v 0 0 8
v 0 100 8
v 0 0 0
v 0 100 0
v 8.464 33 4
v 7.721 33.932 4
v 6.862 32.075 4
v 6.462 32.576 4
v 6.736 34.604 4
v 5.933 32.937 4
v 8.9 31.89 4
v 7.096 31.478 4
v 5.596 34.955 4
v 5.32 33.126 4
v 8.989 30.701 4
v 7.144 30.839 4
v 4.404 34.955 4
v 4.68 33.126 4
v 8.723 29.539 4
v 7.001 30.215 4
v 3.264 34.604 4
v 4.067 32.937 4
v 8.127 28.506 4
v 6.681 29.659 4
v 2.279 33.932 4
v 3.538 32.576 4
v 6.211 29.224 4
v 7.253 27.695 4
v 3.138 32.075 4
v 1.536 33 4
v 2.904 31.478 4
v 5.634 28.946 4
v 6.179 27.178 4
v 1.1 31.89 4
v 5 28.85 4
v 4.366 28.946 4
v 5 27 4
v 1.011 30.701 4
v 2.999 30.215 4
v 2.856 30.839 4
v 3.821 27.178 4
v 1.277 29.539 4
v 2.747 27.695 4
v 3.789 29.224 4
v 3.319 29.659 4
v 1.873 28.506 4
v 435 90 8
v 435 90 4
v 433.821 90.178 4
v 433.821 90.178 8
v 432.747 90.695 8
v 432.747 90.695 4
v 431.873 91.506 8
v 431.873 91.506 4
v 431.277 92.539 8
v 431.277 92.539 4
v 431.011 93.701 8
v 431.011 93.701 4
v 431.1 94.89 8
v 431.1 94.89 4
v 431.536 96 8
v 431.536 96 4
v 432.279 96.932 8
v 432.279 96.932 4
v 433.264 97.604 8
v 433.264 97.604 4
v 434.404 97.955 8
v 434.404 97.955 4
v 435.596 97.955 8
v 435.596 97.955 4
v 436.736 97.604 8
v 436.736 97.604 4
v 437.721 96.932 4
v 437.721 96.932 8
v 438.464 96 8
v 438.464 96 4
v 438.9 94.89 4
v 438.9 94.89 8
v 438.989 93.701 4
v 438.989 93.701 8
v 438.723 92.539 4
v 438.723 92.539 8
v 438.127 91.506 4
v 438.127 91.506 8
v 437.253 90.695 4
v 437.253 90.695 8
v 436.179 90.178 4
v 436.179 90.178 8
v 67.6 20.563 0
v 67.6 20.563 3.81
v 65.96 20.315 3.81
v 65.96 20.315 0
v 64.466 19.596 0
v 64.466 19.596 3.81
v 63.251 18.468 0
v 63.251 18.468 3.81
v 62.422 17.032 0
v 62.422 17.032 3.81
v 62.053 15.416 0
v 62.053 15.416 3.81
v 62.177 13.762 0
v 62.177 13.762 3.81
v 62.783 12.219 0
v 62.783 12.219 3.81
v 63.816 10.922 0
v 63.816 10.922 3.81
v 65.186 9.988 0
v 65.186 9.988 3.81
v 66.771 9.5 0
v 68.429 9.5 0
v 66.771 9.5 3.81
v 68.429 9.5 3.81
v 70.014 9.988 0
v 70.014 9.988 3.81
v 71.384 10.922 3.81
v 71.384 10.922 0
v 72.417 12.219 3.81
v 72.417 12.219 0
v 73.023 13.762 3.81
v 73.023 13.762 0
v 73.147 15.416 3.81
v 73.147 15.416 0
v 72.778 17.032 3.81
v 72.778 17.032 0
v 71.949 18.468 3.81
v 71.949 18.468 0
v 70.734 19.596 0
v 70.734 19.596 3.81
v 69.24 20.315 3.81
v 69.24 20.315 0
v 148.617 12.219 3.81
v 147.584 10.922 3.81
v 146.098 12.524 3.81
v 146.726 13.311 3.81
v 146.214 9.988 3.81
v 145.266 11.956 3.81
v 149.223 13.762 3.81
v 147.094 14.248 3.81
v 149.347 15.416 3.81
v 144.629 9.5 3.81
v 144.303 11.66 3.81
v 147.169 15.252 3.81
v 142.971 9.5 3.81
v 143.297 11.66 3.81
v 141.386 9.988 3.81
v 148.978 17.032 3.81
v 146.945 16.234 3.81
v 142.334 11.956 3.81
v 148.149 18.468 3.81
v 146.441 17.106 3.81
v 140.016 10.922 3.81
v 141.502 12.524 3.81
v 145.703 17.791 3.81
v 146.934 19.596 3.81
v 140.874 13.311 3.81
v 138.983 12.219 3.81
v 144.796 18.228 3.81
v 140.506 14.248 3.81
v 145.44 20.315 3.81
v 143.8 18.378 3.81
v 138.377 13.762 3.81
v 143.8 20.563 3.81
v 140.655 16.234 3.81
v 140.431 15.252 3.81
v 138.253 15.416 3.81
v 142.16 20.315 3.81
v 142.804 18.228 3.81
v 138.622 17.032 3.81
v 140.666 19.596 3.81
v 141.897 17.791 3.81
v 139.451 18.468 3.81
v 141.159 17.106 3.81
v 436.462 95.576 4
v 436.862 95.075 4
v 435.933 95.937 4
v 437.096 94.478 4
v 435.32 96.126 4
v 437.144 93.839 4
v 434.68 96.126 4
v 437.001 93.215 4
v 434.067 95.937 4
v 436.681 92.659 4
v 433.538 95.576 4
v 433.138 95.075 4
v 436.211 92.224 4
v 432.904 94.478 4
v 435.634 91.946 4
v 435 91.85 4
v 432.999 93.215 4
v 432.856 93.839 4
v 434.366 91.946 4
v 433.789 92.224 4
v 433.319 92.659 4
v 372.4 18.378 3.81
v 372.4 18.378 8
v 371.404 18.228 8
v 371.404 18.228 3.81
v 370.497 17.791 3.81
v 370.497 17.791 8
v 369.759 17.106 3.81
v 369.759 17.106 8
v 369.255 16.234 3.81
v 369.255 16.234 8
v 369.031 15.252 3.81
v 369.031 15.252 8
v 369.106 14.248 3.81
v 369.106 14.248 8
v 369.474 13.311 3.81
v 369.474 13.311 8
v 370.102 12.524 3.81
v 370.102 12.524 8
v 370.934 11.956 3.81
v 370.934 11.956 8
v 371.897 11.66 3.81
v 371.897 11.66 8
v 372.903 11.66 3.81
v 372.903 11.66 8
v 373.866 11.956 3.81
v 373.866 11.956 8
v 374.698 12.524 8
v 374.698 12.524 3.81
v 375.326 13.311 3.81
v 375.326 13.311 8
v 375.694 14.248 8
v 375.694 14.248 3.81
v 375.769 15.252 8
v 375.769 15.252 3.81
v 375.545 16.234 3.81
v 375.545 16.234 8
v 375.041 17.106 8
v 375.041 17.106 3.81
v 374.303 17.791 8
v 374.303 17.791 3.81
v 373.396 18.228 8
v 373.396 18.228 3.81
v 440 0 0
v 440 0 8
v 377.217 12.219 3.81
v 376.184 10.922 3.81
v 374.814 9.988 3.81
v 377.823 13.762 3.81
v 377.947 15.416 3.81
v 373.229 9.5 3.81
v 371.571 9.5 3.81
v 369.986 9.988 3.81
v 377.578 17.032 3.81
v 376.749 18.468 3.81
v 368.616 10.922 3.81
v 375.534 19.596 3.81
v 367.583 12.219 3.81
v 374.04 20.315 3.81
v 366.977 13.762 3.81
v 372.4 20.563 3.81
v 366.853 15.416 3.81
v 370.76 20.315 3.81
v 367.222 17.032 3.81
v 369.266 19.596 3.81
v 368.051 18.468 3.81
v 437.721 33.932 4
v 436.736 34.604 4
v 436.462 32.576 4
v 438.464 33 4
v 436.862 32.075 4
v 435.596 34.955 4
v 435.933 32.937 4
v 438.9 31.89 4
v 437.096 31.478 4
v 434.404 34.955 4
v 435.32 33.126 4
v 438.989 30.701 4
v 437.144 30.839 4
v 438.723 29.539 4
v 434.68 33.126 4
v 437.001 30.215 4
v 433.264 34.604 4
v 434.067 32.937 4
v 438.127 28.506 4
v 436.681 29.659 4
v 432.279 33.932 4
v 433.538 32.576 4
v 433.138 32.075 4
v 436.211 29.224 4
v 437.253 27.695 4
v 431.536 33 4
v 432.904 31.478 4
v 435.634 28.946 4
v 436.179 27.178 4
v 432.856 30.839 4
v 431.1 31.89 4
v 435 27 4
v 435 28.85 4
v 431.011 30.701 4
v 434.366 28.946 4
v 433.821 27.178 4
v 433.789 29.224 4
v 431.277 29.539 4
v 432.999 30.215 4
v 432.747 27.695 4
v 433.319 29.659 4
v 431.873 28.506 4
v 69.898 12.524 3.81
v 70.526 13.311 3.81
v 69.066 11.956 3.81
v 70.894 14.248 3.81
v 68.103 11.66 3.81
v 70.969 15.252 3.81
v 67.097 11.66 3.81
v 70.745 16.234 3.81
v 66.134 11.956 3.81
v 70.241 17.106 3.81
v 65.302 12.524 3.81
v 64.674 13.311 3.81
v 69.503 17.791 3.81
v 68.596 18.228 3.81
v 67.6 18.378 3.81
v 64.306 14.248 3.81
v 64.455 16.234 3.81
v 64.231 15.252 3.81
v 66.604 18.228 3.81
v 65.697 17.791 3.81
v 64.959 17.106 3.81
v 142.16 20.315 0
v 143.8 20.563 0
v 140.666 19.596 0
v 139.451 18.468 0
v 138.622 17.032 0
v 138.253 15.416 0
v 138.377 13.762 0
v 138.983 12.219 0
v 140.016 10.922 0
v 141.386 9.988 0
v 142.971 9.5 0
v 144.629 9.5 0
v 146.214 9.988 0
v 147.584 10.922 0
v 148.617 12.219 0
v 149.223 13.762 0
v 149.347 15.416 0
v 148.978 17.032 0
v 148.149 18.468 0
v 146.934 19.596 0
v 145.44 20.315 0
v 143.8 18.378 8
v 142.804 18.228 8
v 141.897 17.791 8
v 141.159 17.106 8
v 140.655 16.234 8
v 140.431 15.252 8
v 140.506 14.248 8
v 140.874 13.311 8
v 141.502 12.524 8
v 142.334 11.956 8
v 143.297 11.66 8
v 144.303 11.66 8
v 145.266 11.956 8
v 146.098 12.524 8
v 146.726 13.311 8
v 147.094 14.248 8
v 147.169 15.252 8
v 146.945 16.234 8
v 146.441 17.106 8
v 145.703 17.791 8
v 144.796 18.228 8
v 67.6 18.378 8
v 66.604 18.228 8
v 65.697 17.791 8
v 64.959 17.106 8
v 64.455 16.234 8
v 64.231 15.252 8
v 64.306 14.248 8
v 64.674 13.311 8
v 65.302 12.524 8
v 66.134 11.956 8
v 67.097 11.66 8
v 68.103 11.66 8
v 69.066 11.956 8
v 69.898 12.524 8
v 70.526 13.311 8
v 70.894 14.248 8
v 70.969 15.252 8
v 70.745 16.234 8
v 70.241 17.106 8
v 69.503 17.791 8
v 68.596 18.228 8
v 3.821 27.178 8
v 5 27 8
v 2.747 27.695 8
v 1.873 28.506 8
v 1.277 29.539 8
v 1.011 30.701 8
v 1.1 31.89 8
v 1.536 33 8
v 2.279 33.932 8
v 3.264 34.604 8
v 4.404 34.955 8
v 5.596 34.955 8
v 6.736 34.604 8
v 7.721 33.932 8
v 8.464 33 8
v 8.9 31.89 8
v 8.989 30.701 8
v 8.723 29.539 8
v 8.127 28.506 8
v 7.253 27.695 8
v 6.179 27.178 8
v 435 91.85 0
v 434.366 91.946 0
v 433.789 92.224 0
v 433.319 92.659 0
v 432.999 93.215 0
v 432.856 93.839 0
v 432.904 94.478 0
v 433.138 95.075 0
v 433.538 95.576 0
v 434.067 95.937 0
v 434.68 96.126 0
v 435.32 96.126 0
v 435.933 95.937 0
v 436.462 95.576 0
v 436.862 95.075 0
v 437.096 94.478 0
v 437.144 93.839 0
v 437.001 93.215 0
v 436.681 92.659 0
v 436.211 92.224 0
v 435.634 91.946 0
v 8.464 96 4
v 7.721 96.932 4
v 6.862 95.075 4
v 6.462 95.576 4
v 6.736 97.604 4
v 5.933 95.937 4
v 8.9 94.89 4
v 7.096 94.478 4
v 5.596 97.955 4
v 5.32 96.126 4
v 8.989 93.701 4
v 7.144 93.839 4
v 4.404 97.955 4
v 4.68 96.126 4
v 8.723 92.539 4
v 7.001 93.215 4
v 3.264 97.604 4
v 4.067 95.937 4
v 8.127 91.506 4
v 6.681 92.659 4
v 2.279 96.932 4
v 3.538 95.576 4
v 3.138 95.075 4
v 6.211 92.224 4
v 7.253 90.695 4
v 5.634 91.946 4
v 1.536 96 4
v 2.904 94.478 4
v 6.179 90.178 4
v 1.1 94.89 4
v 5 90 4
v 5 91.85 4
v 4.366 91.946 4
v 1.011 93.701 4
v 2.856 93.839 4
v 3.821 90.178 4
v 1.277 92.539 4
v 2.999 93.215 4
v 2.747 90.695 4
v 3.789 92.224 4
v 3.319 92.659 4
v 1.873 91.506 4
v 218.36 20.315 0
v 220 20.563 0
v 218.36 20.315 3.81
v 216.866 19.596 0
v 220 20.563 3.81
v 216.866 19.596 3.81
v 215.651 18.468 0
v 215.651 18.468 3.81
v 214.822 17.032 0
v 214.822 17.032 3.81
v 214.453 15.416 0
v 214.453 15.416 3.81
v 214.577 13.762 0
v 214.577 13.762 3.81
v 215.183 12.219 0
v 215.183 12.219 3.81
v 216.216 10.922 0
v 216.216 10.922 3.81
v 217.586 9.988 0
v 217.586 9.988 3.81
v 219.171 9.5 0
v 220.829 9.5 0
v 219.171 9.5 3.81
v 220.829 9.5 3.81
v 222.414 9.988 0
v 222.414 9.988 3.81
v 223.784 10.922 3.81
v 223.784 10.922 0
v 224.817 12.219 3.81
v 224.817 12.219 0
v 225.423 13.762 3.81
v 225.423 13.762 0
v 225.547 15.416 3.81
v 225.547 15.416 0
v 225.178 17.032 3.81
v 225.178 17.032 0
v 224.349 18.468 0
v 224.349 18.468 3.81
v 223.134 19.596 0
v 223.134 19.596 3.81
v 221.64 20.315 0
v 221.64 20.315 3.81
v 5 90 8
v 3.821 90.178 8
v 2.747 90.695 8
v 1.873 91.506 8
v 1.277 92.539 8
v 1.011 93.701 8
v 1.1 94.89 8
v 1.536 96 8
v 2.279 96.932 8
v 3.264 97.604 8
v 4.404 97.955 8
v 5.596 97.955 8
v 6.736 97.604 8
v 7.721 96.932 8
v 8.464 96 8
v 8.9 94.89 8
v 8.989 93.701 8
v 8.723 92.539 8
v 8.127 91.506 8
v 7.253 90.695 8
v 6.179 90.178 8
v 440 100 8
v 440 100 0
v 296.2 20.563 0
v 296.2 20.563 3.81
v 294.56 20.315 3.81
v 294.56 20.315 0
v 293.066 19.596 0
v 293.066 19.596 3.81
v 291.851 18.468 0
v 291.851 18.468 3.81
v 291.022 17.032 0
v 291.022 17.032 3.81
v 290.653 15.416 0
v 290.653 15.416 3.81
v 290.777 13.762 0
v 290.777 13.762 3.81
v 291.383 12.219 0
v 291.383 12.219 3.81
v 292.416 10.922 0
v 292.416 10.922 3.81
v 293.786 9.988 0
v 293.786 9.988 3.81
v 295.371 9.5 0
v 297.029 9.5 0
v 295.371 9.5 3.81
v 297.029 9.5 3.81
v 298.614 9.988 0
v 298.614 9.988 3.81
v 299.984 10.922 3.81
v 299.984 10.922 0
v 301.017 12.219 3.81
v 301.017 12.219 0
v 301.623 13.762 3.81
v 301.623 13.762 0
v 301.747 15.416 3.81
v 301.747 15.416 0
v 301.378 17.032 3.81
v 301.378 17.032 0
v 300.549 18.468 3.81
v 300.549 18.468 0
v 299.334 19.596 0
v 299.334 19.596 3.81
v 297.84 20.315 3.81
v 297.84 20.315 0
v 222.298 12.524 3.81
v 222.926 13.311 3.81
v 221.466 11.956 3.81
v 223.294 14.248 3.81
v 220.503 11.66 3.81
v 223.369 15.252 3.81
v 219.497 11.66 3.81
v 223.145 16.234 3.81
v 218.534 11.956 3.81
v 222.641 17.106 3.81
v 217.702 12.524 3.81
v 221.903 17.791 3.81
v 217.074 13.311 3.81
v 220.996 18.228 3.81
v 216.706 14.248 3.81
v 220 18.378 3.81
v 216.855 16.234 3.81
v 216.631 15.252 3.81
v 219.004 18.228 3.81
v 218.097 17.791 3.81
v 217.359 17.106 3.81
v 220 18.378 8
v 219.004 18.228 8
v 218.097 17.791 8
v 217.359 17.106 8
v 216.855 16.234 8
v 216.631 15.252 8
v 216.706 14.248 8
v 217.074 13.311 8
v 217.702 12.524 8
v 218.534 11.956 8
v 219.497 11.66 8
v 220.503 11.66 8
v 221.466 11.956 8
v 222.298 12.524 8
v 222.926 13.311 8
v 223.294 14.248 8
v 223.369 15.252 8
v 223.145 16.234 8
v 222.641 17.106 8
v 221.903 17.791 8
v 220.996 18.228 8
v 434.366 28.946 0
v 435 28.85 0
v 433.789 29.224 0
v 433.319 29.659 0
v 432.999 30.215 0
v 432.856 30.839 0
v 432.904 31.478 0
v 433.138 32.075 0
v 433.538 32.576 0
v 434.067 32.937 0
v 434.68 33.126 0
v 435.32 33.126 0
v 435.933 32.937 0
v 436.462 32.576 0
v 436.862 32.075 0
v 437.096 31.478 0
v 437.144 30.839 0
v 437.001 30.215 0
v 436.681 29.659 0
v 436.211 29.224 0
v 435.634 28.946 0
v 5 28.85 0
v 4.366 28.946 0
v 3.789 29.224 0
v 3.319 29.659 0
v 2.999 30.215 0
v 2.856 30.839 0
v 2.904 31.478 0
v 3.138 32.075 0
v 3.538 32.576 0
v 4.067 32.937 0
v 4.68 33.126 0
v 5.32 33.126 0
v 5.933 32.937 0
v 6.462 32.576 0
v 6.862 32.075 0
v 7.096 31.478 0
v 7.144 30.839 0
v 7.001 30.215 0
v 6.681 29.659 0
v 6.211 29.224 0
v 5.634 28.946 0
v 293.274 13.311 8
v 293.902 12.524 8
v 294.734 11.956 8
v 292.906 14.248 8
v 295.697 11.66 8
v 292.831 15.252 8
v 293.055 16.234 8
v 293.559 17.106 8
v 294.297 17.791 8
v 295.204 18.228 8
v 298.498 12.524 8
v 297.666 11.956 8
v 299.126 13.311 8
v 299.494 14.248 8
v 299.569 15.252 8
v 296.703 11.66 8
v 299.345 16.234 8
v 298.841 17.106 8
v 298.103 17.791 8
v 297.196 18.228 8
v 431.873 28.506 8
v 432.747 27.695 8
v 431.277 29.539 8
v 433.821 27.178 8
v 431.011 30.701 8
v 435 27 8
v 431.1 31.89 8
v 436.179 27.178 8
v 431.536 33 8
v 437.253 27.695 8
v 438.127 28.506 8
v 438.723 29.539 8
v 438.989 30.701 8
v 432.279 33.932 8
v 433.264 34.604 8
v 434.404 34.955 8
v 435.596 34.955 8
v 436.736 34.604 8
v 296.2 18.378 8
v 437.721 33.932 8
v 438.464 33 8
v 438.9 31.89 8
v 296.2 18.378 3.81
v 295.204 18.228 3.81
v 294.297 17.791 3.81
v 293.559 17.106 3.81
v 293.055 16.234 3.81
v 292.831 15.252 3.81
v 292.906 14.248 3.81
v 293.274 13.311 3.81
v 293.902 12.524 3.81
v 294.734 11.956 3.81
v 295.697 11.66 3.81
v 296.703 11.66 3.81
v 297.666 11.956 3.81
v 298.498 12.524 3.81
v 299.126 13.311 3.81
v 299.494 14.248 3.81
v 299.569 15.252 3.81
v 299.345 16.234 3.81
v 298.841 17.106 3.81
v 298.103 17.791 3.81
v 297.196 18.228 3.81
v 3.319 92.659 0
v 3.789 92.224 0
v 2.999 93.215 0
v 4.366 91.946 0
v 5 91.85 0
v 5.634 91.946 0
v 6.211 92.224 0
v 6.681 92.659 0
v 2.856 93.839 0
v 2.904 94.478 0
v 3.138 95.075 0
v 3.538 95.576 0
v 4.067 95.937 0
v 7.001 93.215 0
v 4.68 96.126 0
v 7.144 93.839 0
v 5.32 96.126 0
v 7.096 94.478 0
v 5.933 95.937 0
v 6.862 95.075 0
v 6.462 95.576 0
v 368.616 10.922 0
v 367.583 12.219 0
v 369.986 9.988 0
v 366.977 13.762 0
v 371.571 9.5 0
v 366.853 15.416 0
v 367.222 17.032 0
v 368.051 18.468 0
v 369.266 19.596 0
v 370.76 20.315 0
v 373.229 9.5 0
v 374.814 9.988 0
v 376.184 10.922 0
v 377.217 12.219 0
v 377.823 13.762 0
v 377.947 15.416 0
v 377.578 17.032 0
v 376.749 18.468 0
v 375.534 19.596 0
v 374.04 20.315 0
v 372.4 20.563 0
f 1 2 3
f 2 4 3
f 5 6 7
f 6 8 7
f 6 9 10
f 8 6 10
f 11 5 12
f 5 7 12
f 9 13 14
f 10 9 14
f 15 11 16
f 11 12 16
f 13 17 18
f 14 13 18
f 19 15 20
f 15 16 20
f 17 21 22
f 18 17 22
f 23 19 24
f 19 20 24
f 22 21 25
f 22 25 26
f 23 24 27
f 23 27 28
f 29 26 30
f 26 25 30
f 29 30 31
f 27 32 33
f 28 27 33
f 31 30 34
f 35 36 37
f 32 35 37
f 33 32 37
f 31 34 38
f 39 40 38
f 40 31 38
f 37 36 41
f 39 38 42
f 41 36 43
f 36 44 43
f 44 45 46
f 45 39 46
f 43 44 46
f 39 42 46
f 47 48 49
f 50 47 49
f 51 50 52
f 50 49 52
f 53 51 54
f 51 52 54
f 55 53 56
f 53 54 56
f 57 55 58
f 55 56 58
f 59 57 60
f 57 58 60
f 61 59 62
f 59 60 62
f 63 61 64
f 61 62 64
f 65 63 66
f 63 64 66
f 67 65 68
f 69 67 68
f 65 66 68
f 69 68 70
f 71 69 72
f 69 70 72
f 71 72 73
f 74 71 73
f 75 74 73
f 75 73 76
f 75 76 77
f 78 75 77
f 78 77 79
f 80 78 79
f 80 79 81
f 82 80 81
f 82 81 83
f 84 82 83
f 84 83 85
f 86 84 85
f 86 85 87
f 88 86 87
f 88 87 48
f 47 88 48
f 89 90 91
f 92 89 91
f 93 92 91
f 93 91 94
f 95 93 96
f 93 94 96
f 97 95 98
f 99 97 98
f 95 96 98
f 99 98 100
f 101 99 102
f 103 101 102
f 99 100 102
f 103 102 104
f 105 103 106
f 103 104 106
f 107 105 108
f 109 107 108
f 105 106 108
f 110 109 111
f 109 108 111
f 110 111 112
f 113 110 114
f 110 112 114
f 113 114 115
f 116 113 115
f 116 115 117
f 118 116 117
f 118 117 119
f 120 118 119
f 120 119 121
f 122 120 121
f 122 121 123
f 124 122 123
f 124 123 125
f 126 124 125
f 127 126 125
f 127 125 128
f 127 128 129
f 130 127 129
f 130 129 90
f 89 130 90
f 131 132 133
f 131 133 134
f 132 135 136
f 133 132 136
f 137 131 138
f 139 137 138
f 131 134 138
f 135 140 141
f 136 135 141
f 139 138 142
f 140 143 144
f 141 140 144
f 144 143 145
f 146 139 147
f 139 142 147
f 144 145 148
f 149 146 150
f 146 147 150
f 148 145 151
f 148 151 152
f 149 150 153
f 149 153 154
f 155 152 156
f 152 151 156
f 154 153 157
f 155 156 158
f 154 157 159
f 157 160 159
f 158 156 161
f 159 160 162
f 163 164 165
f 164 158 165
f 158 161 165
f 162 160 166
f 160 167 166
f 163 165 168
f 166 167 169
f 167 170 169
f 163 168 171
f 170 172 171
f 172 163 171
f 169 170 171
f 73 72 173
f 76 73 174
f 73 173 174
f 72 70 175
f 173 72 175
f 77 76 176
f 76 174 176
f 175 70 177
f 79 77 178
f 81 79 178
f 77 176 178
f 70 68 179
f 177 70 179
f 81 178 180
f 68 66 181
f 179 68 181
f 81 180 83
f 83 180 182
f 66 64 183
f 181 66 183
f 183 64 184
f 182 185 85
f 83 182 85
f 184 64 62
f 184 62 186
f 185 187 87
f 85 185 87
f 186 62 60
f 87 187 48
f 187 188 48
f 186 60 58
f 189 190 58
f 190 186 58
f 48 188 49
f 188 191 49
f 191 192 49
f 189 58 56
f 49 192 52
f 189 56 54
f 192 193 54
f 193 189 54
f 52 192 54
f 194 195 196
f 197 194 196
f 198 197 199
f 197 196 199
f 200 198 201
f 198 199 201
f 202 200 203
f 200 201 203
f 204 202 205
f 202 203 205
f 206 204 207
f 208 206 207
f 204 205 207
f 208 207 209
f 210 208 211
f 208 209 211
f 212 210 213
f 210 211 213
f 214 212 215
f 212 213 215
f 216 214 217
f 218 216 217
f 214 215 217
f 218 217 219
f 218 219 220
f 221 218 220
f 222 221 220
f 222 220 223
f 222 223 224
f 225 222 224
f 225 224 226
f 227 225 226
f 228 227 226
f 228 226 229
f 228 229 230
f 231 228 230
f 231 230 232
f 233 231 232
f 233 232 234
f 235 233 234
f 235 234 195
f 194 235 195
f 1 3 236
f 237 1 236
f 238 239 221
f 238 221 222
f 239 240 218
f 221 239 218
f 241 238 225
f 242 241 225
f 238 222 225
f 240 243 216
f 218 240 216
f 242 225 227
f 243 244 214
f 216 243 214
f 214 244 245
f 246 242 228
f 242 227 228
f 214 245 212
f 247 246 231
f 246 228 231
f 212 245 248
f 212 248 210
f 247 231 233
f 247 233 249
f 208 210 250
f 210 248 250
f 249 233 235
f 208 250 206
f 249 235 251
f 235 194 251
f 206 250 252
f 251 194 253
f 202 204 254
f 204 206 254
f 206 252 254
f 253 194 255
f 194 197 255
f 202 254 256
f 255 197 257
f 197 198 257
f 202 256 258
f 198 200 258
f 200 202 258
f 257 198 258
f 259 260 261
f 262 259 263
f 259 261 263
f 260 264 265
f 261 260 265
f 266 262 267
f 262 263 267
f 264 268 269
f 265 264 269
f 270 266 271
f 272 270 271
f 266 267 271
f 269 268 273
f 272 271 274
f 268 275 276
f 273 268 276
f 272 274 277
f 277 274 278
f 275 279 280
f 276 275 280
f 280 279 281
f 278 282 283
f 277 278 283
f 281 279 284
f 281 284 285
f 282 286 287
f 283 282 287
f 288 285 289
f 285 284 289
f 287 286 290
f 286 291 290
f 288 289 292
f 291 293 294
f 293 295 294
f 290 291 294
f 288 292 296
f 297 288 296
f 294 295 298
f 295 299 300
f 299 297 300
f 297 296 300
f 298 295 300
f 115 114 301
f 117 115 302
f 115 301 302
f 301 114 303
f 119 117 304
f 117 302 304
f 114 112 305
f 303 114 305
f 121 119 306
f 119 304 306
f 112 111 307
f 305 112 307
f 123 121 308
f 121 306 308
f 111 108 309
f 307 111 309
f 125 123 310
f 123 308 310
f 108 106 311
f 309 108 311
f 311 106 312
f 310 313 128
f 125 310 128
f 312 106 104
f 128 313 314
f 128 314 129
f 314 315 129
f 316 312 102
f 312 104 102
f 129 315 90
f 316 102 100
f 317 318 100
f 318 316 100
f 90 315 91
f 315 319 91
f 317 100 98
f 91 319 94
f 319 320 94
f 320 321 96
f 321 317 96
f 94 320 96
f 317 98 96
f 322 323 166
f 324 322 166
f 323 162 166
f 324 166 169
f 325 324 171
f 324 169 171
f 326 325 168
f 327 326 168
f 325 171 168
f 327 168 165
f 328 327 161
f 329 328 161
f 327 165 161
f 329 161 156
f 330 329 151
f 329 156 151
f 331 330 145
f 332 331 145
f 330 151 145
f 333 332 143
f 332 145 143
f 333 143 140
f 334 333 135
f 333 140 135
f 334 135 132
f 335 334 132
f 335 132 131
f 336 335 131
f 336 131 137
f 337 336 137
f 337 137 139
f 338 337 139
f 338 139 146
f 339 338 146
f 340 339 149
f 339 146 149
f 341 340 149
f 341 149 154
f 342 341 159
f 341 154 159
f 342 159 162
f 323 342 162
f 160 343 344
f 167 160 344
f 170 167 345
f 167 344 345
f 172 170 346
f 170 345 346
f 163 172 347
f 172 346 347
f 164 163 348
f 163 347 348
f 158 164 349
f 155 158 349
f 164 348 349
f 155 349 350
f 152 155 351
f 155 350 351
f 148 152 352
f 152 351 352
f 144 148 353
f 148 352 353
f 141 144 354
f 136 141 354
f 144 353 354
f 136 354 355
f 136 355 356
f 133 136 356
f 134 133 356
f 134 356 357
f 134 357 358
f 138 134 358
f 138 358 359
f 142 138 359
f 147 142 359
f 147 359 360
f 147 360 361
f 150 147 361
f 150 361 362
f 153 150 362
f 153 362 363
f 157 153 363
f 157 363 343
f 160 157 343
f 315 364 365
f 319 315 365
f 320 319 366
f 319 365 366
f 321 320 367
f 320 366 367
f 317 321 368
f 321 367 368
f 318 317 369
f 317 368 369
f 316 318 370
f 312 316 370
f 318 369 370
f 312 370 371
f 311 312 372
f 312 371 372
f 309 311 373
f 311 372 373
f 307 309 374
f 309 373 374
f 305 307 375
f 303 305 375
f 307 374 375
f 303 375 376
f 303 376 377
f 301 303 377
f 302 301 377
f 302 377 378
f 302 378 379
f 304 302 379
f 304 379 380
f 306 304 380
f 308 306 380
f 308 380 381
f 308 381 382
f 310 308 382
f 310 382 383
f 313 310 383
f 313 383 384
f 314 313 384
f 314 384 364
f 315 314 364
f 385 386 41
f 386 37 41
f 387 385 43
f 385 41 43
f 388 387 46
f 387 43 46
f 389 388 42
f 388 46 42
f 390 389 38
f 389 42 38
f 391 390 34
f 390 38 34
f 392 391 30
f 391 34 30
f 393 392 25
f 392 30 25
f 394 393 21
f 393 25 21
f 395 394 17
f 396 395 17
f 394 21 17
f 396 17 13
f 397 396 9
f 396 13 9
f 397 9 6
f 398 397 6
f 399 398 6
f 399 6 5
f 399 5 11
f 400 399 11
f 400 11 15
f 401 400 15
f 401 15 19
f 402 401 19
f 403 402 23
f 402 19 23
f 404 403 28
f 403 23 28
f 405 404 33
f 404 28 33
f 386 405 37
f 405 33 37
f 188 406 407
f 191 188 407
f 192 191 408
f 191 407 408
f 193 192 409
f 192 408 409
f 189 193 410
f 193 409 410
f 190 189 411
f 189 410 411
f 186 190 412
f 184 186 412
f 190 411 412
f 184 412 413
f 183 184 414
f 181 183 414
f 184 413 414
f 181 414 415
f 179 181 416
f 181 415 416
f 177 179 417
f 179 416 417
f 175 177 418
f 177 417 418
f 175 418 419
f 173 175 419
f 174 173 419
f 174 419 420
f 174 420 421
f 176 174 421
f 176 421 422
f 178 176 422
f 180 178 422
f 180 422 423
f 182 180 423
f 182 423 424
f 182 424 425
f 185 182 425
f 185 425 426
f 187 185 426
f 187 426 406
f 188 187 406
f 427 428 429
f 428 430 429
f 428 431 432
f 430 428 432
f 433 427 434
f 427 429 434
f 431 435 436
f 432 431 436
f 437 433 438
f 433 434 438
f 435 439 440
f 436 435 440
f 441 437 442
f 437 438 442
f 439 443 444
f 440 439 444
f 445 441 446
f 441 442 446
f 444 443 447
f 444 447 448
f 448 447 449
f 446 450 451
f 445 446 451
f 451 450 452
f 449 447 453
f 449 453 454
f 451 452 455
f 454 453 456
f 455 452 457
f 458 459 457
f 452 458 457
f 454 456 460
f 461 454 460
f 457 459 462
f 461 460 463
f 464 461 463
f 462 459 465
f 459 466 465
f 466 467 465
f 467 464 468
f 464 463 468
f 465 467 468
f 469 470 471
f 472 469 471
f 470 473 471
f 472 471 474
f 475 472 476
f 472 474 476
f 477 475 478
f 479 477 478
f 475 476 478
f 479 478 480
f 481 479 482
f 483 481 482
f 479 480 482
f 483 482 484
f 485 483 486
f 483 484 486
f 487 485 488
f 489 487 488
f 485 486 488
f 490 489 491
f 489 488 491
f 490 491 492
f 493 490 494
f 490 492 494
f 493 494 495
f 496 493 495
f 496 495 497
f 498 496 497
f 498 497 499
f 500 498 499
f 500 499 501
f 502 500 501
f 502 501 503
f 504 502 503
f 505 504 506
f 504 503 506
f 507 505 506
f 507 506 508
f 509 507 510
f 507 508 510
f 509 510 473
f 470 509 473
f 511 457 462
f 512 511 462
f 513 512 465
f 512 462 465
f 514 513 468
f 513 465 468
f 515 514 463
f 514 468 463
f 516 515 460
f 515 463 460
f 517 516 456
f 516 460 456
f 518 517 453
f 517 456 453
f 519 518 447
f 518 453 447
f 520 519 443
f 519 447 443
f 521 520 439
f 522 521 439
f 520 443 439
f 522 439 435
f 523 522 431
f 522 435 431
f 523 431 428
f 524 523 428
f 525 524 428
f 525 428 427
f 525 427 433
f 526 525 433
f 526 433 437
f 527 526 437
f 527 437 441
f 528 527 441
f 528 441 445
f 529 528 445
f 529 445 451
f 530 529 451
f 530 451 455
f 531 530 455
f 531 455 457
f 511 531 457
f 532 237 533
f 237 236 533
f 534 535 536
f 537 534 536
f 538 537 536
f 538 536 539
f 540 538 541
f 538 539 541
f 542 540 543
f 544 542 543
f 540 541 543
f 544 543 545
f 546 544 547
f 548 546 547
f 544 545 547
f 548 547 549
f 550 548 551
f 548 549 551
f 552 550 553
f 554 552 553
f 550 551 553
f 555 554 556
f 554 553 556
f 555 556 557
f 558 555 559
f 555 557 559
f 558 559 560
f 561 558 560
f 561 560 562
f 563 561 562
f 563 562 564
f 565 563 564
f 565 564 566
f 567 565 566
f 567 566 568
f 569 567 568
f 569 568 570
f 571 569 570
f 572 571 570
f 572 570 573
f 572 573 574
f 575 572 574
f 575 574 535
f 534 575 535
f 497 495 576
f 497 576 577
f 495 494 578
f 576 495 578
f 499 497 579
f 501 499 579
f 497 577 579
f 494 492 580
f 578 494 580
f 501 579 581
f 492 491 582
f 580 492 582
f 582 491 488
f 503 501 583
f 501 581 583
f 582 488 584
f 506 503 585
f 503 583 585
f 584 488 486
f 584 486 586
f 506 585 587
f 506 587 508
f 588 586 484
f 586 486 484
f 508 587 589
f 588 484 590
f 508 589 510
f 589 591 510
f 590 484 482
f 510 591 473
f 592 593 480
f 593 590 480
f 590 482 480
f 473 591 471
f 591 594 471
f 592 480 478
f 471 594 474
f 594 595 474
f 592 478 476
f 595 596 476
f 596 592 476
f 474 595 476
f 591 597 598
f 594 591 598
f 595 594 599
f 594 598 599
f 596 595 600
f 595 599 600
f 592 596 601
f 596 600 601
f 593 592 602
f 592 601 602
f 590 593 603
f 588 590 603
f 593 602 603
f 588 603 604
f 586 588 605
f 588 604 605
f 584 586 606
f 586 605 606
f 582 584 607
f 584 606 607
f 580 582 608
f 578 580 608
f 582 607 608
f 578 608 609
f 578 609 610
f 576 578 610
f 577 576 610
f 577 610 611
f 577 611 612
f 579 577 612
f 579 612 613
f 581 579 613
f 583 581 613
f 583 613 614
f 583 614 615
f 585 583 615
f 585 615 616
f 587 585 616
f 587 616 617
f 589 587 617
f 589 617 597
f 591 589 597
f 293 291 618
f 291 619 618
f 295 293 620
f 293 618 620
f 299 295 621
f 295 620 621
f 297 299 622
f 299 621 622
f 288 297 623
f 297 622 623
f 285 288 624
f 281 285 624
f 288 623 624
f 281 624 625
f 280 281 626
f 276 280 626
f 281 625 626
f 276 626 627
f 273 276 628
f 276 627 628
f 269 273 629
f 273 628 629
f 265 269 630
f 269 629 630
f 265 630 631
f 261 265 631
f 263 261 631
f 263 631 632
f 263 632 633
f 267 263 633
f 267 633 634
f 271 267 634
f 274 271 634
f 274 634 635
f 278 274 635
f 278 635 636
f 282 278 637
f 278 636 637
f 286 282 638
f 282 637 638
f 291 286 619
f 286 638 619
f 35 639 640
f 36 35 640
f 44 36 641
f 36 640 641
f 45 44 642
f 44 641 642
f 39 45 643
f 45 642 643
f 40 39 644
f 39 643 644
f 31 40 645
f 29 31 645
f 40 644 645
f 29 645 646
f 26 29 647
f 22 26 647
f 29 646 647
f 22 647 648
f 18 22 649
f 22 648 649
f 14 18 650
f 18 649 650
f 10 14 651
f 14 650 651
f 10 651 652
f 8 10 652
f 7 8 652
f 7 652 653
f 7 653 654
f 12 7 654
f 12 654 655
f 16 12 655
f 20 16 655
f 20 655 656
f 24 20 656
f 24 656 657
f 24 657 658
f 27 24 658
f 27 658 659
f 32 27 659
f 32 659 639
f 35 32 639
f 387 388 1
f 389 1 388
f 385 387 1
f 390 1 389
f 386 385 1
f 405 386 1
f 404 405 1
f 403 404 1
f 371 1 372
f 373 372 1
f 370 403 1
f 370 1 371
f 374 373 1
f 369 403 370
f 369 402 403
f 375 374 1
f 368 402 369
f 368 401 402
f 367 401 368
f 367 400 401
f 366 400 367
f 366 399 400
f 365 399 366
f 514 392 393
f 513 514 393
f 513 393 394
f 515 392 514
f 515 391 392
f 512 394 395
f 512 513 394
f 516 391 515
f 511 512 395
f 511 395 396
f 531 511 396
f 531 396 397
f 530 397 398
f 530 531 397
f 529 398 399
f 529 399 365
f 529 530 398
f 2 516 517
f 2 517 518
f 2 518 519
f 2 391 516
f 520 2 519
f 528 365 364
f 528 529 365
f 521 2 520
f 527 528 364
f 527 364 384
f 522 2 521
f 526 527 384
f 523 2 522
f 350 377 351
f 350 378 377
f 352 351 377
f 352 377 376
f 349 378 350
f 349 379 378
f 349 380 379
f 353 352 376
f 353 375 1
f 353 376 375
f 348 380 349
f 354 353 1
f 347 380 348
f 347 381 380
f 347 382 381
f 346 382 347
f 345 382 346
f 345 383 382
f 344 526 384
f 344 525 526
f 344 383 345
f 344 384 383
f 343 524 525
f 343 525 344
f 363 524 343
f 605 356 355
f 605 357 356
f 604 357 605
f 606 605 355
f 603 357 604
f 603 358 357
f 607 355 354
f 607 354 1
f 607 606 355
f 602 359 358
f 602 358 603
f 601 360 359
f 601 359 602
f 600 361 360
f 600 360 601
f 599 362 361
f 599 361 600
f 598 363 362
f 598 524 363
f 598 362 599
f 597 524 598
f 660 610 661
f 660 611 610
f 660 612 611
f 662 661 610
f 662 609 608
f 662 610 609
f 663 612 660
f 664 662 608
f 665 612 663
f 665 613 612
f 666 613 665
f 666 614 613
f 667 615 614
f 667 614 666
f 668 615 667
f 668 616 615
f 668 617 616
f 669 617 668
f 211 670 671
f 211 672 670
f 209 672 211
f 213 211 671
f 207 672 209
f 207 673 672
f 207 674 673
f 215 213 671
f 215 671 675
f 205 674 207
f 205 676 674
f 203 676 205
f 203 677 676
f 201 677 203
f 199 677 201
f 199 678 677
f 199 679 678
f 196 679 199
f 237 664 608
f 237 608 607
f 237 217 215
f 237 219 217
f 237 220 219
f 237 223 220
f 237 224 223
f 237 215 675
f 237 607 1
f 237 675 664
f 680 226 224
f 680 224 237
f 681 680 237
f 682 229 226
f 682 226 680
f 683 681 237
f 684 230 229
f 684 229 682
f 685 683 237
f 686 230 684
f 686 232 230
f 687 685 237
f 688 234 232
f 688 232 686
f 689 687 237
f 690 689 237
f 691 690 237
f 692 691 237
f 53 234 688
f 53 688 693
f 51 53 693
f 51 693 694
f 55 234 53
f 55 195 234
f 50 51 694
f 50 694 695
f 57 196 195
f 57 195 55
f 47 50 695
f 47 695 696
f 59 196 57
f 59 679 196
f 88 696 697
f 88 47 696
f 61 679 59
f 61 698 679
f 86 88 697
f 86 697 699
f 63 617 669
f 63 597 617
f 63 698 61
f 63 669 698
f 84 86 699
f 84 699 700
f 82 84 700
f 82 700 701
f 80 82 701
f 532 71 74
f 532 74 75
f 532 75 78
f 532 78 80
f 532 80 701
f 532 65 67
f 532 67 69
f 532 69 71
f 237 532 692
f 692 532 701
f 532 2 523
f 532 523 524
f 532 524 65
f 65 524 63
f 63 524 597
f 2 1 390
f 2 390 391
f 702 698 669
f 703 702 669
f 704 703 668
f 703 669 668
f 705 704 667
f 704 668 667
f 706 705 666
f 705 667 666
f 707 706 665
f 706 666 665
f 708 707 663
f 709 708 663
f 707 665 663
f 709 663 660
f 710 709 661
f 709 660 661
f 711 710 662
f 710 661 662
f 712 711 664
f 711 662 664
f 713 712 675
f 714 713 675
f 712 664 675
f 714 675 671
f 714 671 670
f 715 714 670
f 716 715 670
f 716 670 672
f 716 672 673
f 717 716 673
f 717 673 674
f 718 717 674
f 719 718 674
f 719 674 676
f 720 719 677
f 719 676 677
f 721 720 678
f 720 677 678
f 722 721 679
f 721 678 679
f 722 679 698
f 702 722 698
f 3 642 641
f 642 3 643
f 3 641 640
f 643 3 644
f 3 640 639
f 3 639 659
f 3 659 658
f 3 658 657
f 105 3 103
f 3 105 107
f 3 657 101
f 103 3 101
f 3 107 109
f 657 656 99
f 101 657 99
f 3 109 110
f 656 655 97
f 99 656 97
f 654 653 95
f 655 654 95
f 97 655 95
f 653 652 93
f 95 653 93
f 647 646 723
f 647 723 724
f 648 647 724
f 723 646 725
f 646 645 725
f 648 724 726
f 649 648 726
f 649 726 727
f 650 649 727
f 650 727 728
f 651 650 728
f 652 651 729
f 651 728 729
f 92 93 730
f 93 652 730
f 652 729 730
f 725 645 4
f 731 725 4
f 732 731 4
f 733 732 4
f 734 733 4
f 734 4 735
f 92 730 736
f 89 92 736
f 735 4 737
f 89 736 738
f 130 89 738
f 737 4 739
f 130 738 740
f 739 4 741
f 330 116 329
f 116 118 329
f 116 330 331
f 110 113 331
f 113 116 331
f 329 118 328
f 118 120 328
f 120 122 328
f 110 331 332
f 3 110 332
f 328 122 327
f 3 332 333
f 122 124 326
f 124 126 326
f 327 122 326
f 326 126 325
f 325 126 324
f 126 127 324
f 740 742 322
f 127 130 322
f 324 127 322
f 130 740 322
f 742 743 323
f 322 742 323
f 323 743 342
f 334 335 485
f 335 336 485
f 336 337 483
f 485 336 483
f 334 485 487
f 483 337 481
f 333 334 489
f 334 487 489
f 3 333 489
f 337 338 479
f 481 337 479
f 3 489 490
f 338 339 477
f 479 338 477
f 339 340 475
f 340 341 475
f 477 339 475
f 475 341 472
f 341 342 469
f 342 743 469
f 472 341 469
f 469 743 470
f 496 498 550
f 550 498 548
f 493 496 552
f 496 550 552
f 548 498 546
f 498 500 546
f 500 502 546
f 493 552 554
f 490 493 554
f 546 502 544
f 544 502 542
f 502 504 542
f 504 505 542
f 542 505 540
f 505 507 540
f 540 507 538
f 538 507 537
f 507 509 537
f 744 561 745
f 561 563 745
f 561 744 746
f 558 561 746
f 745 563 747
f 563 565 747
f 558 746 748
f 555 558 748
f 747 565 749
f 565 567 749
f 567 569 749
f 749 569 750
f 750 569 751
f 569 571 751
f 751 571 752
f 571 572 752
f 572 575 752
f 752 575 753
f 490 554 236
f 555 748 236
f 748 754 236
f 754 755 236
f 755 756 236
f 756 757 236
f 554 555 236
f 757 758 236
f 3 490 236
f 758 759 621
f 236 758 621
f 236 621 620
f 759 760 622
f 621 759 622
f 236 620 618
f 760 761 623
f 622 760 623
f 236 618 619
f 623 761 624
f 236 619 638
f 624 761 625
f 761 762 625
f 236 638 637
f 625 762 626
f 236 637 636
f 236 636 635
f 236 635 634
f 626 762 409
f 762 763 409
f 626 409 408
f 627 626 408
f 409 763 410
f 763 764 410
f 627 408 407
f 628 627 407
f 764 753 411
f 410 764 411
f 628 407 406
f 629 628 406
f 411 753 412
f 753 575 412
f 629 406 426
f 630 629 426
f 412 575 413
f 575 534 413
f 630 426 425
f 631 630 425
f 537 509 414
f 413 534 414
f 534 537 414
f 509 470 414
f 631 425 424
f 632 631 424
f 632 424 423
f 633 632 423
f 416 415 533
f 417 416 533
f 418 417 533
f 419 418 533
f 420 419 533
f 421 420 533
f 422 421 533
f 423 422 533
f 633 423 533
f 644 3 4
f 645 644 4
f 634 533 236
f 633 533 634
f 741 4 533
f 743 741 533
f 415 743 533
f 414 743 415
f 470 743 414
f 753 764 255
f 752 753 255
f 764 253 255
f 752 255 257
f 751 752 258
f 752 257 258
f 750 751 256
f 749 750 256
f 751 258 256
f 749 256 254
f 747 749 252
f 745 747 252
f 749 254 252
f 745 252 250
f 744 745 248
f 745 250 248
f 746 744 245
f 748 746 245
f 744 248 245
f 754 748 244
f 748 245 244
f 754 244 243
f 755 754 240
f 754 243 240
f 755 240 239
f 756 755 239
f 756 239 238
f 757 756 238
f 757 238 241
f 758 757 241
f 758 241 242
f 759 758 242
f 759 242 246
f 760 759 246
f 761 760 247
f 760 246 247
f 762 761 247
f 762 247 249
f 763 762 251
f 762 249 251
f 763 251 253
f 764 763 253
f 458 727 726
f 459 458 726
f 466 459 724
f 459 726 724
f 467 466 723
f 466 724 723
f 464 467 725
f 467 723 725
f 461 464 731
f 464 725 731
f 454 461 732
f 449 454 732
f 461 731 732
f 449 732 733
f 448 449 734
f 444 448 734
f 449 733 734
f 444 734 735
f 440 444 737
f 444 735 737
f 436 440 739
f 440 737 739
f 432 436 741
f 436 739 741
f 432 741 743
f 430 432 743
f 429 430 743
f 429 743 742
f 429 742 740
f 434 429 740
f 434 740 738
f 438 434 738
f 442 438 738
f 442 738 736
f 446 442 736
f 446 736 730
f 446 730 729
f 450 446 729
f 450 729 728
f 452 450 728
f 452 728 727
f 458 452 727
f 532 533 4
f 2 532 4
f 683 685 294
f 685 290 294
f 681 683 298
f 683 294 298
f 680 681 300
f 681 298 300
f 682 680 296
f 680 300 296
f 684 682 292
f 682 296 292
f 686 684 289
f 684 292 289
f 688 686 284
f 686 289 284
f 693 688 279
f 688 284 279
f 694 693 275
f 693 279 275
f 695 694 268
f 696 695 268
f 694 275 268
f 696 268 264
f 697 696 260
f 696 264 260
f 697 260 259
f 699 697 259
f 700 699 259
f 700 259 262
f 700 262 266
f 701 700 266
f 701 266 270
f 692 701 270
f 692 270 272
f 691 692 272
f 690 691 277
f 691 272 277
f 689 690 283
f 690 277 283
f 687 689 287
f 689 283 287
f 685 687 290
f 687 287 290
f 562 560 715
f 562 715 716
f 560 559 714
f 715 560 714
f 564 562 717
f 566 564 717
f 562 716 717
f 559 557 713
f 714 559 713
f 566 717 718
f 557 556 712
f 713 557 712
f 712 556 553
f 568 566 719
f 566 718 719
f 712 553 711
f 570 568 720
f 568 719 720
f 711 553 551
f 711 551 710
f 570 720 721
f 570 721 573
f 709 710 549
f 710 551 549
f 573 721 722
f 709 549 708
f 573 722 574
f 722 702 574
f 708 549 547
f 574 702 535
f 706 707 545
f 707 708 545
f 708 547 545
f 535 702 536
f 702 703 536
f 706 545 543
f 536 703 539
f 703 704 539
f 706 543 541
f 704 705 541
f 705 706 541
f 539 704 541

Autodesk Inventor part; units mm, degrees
ref_plane "YZ Plane" through (0, 0, 0) normal (1, 0, 0) x (0, 1, 0)
ref_plane "XZ Plane" through (0, 0, 0) normal (0, 1, 0) x (-1, 0, 0)
ref_plane "XY Plane" through (0, 0, 0) normal (0, 0, 1) x (1, 0, 0)
sketch "Sketch1" plane through (0, 0, 0) normal (0, 0, 1) x (1, 0, 0)
  line L0 (0, 0) -> (440, 0)
  line L1 (440, 0) -> (440, 100)
  line L2 (440, 100) -> (0, 100)
  line L3 (0, 100) -> (0, 0)
  dimension "d0" = 100
  dimension "d1" = 440
extrude "Extrusion1" add sketch "Sketch1" along normal blind 8
sketch "Sketch2" plane through (0, 0, 8) normal (0, 0, 1) x (1, 0, 0)
  line L0 (0, 0) -> (0, 100) projected
  line L1 (440, 100) -> (440, 0) projected
  line L2 (0, 100) -> (440, 100) projected
  point P0 (435, 31)
  point P1 (435, 94)
  point P2 (5, 31)
  point P3 (5, 94)
  dimension "d5" = 6
  dimension "d6" = 5
  dimension "d7" = 5
  dimension "d46" = 69
hole "Hole1" at (435, 31, 8) at (435, 94, 8) at (5, 31, 8) at (5, 94, 8) direction (0, 0, -1) diameter 4.3 end through all counterbore diameter 8 counterbore depth 4 clearance for "Socket Head Cap Screw" size "M4" standard "Ansi Metric M Profile"
sketch "Sketch3" plane through (0, 0, 0) normal (0, 0, -1) x (-1, 0, 0)
  line L0 (0, 0) -> (-440, 0) projected
  line L1 (0, 100) -> (0, 0) projected
  point P0 (-67.6, 15)
  point P1 (-143.8, 15)
  point P2 (-220, 15)
  point P3 (-296.2, 15)
  point P4 (-372.4, 15)
  dimension "d15" = 67.6
  dimension "d16" = 15
  dimension "d40" = 76.2
  dimension "d45" = 440
hole "Hole2" at (67.6, 15, 0) at (143.8, 15, 0) at (220, 15, 0) at (296.2, 15, 0) at (372.4, 15, 0) direction (0, 0, 1) diameter 6.7564 end through all counterbore diameter 11.1252 counterbore depth 3.81 clearance for "Socket Head Cap Screw" size "1/4" standard "Ansi Unified Screw Threads"
equation "\"d7\" = d6"
properties part number "Bottom" material "Aluminum-6061"
